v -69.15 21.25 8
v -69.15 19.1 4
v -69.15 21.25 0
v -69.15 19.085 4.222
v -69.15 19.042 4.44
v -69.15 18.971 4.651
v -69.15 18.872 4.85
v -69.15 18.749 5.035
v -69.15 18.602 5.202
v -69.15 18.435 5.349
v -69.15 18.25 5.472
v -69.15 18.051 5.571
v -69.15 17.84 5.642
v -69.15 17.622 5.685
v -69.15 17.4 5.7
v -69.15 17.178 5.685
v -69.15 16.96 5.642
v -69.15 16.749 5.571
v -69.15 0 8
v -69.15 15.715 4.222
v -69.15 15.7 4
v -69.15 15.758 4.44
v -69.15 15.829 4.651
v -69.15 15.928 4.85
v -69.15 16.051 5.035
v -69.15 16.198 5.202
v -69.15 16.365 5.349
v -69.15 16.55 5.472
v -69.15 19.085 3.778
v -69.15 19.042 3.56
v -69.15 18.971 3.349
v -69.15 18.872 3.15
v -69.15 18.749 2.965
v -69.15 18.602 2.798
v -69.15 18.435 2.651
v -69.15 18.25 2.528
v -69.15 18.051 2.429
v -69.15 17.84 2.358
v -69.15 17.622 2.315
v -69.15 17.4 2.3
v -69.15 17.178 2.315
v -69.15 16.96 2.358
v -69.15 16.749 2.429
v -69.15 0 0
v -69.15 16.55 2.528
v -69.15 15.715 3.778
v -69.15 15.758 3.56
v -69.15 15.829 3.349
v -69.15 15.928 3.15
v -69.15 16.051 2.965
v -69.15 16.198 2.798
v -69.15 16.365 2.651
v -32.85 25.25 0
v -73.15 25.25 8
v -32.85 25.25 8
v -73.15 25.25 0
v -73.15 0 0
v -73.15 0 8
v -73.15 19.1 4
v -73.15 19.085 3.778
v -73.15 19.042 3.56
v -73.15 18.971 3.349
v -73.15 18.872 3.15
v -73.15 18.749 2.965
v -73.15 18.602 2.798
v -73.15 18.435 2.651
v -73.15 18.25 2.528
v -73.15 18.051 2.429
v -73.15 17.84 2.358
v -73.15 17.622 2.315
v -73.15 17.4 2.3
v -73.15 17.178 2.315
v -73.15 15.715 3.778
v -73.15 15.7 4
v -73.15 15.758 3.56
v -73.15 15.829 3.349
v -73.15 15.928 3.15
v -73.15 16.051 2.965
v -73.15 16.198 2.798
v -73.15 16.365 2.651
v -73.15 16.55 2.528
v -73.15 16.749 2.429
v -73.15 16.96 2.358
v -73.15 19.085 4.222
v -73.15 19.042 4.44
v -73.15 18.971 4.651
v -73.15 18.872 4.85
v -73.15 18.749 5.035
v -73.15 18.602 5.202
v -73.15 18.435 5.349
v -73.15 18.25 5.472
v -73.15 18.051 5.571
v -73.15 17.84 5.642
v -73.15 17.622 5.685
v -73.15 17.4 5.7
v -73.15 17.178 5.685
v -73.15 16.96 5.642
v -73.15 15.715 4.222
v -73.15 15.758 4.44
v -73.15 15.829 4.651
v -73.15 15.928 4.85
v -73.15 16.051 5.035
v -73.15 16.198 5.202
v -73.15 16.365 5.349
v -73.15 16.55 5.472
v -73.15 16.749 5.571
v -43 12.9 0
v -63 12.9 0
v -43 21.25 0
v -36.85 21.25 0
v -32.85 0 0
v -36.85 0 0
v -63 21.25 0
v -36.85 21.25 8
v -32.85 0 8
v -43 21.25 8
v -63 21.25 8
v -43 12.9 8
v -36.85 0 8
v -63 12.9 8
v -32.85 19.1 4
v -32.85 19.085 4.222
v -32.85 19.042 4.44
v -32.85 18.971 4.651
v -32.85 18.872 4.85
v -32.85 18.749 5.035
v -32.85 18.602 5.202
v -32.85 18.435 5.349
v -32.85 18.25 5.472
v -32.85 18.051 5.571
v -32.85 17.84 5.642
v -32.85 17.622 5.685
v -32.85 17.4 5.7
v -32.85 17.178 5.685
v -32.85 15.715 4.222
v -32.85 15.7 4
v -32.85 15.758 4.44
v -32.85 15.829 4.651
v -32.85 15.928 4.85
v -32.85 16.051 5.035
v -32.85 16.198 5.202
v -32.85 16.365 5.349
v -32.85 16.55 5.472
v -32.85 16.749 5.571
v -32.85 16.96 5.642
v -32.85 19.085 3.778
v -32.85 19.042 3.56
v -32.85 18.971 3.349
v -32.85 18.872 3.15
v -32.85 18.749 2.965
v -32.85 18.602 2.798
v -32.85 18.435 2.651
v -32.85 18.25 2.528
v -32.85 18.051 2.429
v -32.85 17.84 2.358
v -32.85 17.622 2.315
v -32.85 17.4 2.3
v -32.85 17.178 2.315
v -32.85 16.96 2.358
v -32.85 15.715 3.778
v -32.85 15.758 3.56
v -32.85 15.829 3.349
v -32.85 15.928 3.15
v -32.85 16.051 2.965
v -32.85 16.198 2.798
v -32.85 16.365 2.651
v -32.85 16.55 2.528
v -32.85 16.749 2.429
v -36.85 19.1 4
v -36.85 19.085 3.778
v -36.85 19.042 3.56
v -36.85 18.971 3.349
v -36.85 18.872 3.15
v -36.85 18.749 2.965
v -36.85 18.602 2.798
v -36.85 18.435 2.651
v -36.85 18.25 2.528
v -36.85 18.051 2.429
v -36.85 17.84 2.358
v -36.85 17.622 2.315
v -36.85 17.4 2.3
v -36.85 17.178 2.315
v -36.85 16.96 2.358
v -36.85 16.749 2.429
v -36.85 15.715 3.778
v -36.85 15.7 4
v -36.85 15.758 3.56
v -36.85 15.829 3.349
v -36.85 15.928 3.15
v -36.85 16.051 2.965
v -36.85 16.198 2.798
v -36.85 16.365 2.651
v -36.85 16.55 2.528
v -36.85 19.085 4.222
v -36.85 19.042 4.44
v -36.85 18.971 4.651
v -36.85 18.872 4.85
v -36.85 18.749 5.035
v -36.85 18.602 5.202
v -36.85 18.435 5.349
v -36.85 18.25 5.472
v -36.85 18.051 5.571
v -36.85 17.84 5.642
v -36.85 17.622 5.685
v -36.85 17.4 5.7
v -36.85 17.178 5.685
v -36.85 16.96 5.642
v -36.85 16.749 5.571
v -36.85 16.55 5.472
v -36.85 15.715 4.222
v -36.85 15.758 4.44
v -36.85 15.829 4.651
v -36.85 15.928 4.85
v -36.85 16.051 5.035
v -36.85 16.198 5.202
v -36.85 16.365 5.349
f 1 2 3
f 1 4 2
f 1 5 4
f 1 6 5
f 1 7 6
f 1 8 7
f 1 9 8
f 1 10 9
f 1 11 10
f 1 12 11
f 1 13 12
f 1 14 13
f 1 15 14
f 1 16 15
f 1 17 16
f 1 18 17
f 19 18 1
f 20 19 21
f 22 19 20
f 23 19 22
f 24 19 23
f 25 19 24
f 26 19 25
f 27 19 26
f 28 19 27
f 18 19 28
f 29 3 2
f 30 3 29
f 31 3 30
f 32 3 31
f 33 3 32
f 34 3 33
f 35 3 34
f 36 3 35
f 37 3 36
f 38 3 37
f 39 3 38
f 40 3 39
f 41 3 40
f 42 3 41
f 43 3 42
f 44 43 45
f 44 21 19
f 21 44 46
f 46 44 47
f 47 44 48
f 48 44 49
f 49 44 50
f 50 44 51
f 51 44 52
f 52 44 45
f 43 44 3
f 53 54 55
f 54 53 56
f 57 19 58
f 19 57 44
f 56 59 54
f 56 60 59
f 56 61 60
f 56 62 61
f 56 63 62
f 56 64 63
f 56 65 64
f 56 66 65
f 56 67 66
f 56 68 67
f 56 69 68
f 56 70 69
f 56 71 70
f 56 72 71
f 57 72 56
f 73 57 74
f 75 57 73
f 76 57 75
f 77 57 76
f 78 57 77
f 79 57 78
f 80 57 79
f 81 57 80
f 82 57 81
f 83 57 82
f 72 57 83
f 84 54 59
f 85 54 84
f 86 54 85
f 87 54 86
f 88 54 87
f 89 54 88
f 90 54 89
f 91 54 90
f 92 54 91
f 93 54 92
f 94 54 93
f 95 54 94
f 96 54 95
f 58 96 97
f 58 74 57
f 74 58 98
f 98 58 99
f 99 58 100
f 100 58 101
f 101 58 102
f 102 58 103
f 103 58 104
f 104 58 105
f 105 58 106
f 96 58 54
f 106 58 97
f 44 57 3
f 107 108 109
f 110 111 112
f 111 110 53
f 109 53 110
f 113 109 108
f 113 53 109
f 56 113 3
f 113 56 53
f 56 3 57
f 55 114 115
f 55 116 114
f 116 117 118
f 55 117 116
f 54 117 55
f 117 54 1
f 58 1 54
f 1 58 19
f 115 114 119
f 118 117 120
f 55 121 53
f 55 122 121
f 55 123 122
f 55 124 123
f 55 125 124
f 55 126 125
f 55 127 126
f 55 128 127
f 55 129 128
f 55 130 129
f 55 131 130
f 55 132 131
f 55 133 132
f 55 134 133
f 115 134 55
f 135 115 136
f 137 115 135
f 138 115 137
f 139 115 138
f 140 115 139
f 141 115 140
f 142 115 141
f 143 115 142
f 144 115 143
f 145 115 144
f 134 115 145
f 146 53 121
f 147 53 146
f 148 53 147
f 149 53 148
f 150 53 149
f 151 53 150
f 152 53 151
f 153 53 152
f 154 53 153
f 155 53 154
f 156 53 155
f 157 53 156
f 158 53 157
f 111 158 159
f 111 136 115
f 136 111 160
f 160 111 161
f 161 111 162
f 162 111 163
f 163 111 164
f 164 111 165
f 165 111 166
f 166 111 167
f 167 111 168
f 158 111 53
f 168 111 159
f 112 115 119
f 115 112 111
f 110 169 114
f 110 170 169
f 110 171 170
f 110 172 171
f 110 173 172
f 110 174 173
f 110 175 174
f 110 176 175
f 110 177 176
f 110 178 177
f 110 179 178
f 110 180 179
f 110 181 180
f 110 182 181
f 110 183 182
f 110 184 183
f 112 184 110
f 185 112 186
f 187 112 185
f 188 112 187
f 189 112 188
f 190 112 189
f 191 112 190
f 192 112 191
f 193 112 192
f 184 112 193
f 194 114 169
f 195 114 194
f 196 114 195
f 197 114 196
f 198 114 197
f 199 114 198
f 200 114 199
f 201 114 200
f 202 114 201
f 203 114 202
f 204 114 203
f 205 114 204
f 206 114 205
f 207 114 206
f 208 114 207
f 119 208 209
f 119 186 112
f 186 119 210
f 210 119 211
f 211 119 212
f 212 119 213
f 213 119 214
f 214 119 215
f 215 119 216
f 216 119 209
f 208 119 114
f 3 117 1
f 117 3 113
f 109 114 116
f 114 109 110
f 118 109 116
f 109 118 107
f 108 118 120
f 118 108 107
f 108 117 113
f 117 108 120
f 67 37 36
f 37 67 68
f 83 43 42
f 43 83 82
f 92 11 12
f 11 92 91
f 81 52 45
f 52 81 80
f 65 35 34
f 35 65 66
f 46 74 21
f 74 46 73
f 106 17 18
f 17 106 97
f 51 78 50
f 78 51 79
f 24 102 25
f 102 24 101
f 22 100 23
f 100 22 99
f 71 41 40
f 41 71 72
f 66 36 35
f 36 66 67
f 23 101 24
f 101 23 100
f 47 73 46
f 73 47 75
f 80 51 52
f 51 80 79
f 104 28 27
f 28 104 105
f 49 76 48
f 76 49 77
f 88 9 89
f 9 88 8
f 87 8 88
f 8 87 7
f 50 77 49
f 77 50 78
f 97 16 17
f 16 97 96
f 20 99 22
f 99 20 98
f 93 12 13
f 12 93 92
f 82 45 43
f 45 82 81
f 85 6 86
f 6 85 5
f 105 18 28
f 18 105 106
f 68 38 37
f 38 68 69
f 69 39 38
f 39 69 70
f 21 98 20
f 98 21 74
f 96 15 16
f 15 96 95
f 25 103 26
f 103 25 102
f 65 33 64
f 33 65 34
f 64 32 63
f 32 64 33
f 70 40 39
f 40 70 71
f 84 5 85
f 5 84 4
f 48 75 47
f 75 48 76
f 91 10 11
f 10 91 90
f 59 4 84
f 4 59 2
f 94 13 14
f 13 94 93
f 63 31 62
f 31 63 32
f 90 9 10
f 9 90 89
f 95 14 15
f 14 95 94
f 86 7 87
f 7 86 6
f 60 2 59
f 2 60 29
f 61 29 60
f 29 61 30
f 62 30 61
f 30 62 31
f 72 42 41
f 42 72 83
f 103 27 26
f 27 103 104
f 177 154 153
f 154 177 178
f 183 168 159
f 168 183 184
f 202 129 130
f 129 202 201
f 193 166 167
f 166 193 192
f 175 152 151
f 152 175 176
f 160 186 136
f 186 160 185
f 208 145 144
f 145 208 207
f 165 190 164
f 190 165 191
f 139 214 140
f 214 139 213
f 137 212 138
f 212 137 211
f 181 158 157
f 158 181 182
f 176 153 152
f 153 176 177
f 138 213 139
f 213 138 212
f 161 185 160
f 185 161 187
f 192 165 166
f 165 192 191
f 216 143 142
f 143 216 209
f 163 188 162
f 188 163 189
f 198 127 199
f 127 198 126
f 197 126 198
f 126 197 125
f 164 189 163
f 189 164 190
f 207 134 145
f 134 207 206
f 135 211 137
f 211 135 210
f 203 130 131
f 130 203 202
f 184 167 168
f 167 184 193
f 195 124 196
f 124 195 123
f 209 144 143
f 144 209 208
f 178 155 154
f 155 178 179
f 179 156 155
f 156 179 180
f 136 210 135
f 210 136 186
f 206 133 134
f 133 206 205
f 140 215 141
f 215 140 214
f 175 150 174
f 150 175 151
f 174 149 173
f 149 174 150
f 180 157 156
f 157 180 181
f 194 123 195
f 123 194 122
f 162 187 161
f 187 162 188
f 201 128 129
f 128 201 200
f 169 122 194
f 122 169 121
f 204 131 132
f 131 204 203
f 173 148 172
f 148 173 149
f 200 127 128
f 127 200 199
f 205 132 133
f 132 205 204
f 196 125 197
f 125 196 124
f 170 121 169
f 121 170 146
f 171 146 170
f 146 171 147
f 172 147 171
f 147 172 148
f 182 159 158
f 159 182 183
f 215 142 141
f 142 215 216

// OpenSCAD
// file: rear_servo_holder.scad
// PROVISIONAL SG90 body cradle for the existing rear plate/support stack.
// Geometry only: real servo ears, cable exit, wall fixing and load capacity
// still require physical measurement and testing before powered operation.
include <parameters.scad>
$fn = 48;

holder_flange_thickness = 5.0;
holder_flange_inner_x = rear_back_surface_x - rear_plate_standoff
                         - rear_plate_thickness - 5.0; // support outer face
holder_flange_outer_x = holder_flange_inner_x - holder_flange_thickness;
holder_rail_width_y = 12.0;
holder_rail_z0 = rear_plate_center_z - rear_plate_height / 2 + 8.0;
holder_rail_z1 = rear_plate_center_z + rear_plate_height / 2 - 8.0;

// Servo shaft is along Y; the body extends behind the original horn.
holder_servo_body_y0 = servo_body_front_y;
holder_servo_body_y1 = holder_servo_body_y0 + servo_body_z;
holder_servo_xc = bell_servo_x - servo_shaft_offset_x;
holder_body_x0 = holder_servo_xc - servo_body_x / 2;
holder_body_x1 = holder_servo_xc + servo_body_x / 2;
holder_body_z0 = bell_servo_z - servo_body_y / 2;
holder_body_z1 = bell_servo_z + servo_body_y / 2;
holder_body_gap = body_clearance_per_side; // tune from fit coupon
holder_wall = 4.0;
holder_base = 4.0;
holder_tray_x0 = holder_body_x0 - holder_body_gap - holder_wall;
holder_tray_x1 = holder_body_x1 + holder_body_gap + holder_wall;
// Trim the forward tray to leave the reported horn/saddle sweep clear.
// 3.5 mm retaining lip ahead of the case face remains PROVISIONAL.
holder_tray_y0 = holder_servo_body_y0 - 3.5;
holder_tray_y1 = holder_servo_body_y1 + 4.0;
holder_tray_z0 = holder_body_z0 - holder_body_gap - holder_base;
holder_tray_z1 = holder_body_z0 - holder_body_gap;

// A removable bridge holds the rear end of the servo body for fit tests.
holder_cap_y0 = 16.0; // PROVISIONAL; check ears and cable
holder_cap_y1 = 24.0;
holder_cap_pin_y = 20.0;
holder_cap_pin_z = -12.0;
holder_cap_leg = 4.0;
holder_cap_side_gap = 0.35; // PROVISIONAL FDM slide clearance
holder_cap_leg_top_z = -8.5;
holder_cap_bridge_z0 = holder_cap_leg_top_z + 0.35;
holder_cap_bridge_z1 = holder_cap_bridge_z0 + 4.0;
holder_cap_body_pad_z0 = holder_body_z1 + 0.4;

assert(holder_servo_body_y1 <= holder_tray_y1);
assert(holder_rail_z0 < rear_plate_center_z - rear_plate_height / 2 + 12);
assert(holder_rail_z1 > rear_plate_center_z + rear_plate_height / 2 - 12);
assert(holder_cap_pin_z - 3.5 > holder_body_z1);

module holder_x_hole(y, z, x0, length) {
    translate([x0, y, z]) rotate([0, 90, 0])
        cylinder(d = stage2_pivot_hole_d, h = length);
}

module rear_servo_holder() {
    difference() {
        union() {
            // Two mounting rails share all four existing support/plate holes.
            for (s = [-1, 1])
                translate([holder_flange_outer_x,
                           s * rear_plate_mount_hole_pitch / 2
                             - holder_rail_width_y / 2,
                           holder_rail_z0])
                    cube([holder_flange_thickness, holder_rail_width_y,
                          holder_rail_z1 - holder_rail_z0]);

            // Two separated triangular ribs avoid the central bell-crank web.
            for (rib_y = [-14, 18])
                hull() {
                    translate([holder_flange_outer_x, rib_y, -75])
                        cube([holder_flange_thickness, 4, 10]);
                    translate([holder_tray_x1 - 7, rib_y, holder_tray_z0])
                        cube([7, 4, holder_base]);
                }

            // Open tray; the front lip clears the horn, rear corners leave
            // a cable opening. The actual cable exit is UNMEASURED.
            translate([holder_tray_x0, holder_tray_y0, holder_tray_z0])
                cube([holder_tray_x1 - holder_tray_x0,
                      holder_tray_y1 - holder_tray_y0, holder_base]);
            for (sx = [-1, 1]) {
                wall_x = sx < 0 ? holder_tray_x0
                                : holder_tray_x1 - holder_wall;
                translate([wall_x, 2, holder_tray_z0])
                    cube([holder_wall, holder_servo_body_y1 - 2,
                          holder_body_z0 + 7 - holder_tray_z0]);
                // Taller rear lugs accept two printed 9 mm grip pins.
                translate([wall_x, holder_cap_y0, holder_tray_z0])
                    cube([holder_wall, holder_cap_y1 - holder_cap_y0,
                          holder_cap_leg_top_z - holder_tray_z0]);
                translate([sx < 0 ? wall_x : wall_x - 5,
                           holder_servo_body_y1, holder_tray_z0])
                    cube([holder_wall + 5, 4, 6]);
            }
            translate([holder_tray_x0, holder_tray_y0, holder_tray_z0])
                cube([holder_tray_x1 - holder_tray_x0,
                      holder_servo_body_y0 - holder_tray_y0, 6]);
        }
        // Use four 15.5 mm grip offset-head pins inserted from the rear plate
        // foot side; standard C-clips on that side collide with the feet.
        for (side = [-1, 1], top = [-1, 1])
            holder_x_hole(side * rear_plate_mount_hole_pitch / 2,
                          rear_plate_center_z
                            + top * (rear_plate_height / 2 - 12),
                          holder_flange_outer_x - 0.1,
                          holder_flange_thickness + 0.2);
        for (sx = [-1, 1])
            holder_x_hole(holder_cap_pin_y, holder_cap_pin_z,
                          sx < 0 ? holder_tray_x0 - 0.1
                                 : holder_tray_x1 - holder_wall - 0.1,
                          holder_wall + 0.2);
    }
}

module servo_holder_cap() {
    difference() {
        union() {
            // Bridge passes above the tall cradle lugs. A central pad drops
            // down to the body; this avoids intersecting the lugs.
            translate([holder_tray_x0 - holder_cap_side_gap
                       - holder_cap_leg, holder_cap_y0,
                       holder_cap_bridge_z0])
                cube([holder_tray_x1 - holder_tray_x0
                      + 2 * (holder_cap_leg + holder_cap_side_gap),
                      holder_cap_y1 - holder_cap_y0,
                      holder_cap_bridge_z1 - holder_cap_bridge_z0]);
            translate([holder_servo_xc - 10, holder_cap_y0,
                       holder_cap_body_pad_z0])
                cube([20, holder_cap_y1 - holder_cap_y0,
                      holder_cap_bridge_z0 - holder_cap_body_pad_z0]);
            for (sx = [-1, 1])
                translate([sx < 0 ? holder_tray_x0 - holder_cap_side_gap
                                      - holder_cap_leg
                                    : holder_tray_x1 + holder_cap_side_gap,
                           holder_cap_y0, holder_tray_z1])
                    cube([holder_cap_leg, holder_cap_y1 - holder_cap_y0,
                          holder_cap_bridge_z1 - holder_tray_z1]);
        }
        for (sx = [-1, 1])
            holder_x_hole(holder_cap_pin_y, holder_cap_pin_z,
                          sx < 0 ? holder_tray_x0 - holder_cap_side_gap
                                     - holder_cap_leg - 0.1
                                 : holder_tray_x1 + holder_cap_side_gap - 0.1,
                          holder_cap_leg + 0.2);
    }
}

// Print orientation: mounting-rail contact faces on the bed, cradle above.
module rear_servo_holder_print() {
    multmatrix([
        [0, 1, 0, 0],
        [0, 0, -1, 0],
        [-1, 0, 0, holder_flange_inner_x],
        [0, 0, 0, 1]
    ]) rear_servo_holder();
}

// Print cap on its broad Y face. It slides over the body after fit check.
module servo_holder_cap_print() {
    multmatrix([
        [1, 0, 0, 0],
        [0, 0, 1, -holder_tray_z1],
        [0, -1, 0, holder_cap_y1],
        [0, 0, 0, 1]
    ]) servo_holder_cap();
}

rear_servo_holder_print();
// main file
// Removable test retainer for the provisional rear SG90 cradle.
use <rear_servo_holder.scad>
servo_holder_cap_print();
